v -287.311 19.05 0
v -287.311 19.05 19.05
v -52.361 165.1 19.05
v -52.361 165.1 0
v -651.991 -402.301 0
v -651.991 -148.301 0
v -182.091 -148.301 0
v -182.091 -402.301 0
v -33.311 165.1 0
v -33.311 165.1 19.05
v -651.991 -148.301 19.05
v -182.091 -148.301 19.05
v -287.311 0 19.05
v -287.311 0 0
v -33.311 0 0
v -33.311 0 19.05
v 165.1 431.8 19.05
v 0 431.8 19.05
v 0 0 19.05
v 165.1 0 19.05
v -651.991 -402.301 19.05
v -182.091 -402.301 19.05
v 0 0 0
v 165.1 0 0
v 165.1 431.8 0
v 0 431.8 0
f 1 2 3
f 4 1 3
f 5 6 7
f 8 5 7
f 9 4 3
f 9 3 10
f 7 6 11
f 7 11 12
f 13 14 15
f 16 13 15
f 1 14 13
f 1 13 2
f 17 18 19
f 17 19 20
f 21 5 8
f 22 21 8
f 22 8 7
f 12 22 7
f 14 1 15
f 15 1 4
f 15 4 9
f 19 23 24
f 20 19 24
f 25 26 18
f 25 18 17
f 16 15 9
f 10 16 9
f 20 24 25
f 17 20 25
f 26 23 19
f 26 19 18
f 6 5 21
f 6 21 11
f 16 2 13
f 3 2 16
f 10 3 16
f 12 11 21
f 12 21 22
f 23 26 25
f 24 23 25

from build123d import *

# Parameters (mm, degrees)
F0_W     = 165.1
F0_H     = 431.8
F1_DEPTH = 19.05
F2_W     = 254
F2_H     = 165.1
F3_DEPTH = 19.05
F5_DEPTH = 19.051
F6_W     = 469.9
F6_H     = 254
F7_DEPTH = 19.05


with BuildPart() as f1:
    # F0 (on Top) → F1 (new body)
    with BuildSketch(Plane.XY):
        with Locations((82.55, 215.9)):
            Rectangle(F0_W, F0_H)
    extrude(amount=F1_DEPTH)


with BuildPart() as f3:
    # F2 (on Top) → F3 (new body)
    with BuildSketch(Plane.XY):
        with Locations((-160.310585, 82.55)):
            Rectangle(F2_W, F2_H)
    extrude(amount=F3_DEPTH)

    # F4 (on face) → F5 (cut, through all)
    with BuildSketch(Plane.XY.offset(19.05)):
        Polygon((-287.310585, 19.05), (-52.360585, 165.1), (-287.310585, 165.1), align=None)
    extrude(amount=-F5_DEPTH, mode=Mode.SUBTRACT)


with BuildPart() as f7:
    # F6 (on Top) → F7 (new body)
    with BuildSketch(Plane.XY):
        with Locations((-417.04063, -275.301196)):
            Rectangle(F6_W, F6_H)
    extrude(amount=F7_DEPTH)


solid = Compound([f1.part, f3.part, f7.part])
